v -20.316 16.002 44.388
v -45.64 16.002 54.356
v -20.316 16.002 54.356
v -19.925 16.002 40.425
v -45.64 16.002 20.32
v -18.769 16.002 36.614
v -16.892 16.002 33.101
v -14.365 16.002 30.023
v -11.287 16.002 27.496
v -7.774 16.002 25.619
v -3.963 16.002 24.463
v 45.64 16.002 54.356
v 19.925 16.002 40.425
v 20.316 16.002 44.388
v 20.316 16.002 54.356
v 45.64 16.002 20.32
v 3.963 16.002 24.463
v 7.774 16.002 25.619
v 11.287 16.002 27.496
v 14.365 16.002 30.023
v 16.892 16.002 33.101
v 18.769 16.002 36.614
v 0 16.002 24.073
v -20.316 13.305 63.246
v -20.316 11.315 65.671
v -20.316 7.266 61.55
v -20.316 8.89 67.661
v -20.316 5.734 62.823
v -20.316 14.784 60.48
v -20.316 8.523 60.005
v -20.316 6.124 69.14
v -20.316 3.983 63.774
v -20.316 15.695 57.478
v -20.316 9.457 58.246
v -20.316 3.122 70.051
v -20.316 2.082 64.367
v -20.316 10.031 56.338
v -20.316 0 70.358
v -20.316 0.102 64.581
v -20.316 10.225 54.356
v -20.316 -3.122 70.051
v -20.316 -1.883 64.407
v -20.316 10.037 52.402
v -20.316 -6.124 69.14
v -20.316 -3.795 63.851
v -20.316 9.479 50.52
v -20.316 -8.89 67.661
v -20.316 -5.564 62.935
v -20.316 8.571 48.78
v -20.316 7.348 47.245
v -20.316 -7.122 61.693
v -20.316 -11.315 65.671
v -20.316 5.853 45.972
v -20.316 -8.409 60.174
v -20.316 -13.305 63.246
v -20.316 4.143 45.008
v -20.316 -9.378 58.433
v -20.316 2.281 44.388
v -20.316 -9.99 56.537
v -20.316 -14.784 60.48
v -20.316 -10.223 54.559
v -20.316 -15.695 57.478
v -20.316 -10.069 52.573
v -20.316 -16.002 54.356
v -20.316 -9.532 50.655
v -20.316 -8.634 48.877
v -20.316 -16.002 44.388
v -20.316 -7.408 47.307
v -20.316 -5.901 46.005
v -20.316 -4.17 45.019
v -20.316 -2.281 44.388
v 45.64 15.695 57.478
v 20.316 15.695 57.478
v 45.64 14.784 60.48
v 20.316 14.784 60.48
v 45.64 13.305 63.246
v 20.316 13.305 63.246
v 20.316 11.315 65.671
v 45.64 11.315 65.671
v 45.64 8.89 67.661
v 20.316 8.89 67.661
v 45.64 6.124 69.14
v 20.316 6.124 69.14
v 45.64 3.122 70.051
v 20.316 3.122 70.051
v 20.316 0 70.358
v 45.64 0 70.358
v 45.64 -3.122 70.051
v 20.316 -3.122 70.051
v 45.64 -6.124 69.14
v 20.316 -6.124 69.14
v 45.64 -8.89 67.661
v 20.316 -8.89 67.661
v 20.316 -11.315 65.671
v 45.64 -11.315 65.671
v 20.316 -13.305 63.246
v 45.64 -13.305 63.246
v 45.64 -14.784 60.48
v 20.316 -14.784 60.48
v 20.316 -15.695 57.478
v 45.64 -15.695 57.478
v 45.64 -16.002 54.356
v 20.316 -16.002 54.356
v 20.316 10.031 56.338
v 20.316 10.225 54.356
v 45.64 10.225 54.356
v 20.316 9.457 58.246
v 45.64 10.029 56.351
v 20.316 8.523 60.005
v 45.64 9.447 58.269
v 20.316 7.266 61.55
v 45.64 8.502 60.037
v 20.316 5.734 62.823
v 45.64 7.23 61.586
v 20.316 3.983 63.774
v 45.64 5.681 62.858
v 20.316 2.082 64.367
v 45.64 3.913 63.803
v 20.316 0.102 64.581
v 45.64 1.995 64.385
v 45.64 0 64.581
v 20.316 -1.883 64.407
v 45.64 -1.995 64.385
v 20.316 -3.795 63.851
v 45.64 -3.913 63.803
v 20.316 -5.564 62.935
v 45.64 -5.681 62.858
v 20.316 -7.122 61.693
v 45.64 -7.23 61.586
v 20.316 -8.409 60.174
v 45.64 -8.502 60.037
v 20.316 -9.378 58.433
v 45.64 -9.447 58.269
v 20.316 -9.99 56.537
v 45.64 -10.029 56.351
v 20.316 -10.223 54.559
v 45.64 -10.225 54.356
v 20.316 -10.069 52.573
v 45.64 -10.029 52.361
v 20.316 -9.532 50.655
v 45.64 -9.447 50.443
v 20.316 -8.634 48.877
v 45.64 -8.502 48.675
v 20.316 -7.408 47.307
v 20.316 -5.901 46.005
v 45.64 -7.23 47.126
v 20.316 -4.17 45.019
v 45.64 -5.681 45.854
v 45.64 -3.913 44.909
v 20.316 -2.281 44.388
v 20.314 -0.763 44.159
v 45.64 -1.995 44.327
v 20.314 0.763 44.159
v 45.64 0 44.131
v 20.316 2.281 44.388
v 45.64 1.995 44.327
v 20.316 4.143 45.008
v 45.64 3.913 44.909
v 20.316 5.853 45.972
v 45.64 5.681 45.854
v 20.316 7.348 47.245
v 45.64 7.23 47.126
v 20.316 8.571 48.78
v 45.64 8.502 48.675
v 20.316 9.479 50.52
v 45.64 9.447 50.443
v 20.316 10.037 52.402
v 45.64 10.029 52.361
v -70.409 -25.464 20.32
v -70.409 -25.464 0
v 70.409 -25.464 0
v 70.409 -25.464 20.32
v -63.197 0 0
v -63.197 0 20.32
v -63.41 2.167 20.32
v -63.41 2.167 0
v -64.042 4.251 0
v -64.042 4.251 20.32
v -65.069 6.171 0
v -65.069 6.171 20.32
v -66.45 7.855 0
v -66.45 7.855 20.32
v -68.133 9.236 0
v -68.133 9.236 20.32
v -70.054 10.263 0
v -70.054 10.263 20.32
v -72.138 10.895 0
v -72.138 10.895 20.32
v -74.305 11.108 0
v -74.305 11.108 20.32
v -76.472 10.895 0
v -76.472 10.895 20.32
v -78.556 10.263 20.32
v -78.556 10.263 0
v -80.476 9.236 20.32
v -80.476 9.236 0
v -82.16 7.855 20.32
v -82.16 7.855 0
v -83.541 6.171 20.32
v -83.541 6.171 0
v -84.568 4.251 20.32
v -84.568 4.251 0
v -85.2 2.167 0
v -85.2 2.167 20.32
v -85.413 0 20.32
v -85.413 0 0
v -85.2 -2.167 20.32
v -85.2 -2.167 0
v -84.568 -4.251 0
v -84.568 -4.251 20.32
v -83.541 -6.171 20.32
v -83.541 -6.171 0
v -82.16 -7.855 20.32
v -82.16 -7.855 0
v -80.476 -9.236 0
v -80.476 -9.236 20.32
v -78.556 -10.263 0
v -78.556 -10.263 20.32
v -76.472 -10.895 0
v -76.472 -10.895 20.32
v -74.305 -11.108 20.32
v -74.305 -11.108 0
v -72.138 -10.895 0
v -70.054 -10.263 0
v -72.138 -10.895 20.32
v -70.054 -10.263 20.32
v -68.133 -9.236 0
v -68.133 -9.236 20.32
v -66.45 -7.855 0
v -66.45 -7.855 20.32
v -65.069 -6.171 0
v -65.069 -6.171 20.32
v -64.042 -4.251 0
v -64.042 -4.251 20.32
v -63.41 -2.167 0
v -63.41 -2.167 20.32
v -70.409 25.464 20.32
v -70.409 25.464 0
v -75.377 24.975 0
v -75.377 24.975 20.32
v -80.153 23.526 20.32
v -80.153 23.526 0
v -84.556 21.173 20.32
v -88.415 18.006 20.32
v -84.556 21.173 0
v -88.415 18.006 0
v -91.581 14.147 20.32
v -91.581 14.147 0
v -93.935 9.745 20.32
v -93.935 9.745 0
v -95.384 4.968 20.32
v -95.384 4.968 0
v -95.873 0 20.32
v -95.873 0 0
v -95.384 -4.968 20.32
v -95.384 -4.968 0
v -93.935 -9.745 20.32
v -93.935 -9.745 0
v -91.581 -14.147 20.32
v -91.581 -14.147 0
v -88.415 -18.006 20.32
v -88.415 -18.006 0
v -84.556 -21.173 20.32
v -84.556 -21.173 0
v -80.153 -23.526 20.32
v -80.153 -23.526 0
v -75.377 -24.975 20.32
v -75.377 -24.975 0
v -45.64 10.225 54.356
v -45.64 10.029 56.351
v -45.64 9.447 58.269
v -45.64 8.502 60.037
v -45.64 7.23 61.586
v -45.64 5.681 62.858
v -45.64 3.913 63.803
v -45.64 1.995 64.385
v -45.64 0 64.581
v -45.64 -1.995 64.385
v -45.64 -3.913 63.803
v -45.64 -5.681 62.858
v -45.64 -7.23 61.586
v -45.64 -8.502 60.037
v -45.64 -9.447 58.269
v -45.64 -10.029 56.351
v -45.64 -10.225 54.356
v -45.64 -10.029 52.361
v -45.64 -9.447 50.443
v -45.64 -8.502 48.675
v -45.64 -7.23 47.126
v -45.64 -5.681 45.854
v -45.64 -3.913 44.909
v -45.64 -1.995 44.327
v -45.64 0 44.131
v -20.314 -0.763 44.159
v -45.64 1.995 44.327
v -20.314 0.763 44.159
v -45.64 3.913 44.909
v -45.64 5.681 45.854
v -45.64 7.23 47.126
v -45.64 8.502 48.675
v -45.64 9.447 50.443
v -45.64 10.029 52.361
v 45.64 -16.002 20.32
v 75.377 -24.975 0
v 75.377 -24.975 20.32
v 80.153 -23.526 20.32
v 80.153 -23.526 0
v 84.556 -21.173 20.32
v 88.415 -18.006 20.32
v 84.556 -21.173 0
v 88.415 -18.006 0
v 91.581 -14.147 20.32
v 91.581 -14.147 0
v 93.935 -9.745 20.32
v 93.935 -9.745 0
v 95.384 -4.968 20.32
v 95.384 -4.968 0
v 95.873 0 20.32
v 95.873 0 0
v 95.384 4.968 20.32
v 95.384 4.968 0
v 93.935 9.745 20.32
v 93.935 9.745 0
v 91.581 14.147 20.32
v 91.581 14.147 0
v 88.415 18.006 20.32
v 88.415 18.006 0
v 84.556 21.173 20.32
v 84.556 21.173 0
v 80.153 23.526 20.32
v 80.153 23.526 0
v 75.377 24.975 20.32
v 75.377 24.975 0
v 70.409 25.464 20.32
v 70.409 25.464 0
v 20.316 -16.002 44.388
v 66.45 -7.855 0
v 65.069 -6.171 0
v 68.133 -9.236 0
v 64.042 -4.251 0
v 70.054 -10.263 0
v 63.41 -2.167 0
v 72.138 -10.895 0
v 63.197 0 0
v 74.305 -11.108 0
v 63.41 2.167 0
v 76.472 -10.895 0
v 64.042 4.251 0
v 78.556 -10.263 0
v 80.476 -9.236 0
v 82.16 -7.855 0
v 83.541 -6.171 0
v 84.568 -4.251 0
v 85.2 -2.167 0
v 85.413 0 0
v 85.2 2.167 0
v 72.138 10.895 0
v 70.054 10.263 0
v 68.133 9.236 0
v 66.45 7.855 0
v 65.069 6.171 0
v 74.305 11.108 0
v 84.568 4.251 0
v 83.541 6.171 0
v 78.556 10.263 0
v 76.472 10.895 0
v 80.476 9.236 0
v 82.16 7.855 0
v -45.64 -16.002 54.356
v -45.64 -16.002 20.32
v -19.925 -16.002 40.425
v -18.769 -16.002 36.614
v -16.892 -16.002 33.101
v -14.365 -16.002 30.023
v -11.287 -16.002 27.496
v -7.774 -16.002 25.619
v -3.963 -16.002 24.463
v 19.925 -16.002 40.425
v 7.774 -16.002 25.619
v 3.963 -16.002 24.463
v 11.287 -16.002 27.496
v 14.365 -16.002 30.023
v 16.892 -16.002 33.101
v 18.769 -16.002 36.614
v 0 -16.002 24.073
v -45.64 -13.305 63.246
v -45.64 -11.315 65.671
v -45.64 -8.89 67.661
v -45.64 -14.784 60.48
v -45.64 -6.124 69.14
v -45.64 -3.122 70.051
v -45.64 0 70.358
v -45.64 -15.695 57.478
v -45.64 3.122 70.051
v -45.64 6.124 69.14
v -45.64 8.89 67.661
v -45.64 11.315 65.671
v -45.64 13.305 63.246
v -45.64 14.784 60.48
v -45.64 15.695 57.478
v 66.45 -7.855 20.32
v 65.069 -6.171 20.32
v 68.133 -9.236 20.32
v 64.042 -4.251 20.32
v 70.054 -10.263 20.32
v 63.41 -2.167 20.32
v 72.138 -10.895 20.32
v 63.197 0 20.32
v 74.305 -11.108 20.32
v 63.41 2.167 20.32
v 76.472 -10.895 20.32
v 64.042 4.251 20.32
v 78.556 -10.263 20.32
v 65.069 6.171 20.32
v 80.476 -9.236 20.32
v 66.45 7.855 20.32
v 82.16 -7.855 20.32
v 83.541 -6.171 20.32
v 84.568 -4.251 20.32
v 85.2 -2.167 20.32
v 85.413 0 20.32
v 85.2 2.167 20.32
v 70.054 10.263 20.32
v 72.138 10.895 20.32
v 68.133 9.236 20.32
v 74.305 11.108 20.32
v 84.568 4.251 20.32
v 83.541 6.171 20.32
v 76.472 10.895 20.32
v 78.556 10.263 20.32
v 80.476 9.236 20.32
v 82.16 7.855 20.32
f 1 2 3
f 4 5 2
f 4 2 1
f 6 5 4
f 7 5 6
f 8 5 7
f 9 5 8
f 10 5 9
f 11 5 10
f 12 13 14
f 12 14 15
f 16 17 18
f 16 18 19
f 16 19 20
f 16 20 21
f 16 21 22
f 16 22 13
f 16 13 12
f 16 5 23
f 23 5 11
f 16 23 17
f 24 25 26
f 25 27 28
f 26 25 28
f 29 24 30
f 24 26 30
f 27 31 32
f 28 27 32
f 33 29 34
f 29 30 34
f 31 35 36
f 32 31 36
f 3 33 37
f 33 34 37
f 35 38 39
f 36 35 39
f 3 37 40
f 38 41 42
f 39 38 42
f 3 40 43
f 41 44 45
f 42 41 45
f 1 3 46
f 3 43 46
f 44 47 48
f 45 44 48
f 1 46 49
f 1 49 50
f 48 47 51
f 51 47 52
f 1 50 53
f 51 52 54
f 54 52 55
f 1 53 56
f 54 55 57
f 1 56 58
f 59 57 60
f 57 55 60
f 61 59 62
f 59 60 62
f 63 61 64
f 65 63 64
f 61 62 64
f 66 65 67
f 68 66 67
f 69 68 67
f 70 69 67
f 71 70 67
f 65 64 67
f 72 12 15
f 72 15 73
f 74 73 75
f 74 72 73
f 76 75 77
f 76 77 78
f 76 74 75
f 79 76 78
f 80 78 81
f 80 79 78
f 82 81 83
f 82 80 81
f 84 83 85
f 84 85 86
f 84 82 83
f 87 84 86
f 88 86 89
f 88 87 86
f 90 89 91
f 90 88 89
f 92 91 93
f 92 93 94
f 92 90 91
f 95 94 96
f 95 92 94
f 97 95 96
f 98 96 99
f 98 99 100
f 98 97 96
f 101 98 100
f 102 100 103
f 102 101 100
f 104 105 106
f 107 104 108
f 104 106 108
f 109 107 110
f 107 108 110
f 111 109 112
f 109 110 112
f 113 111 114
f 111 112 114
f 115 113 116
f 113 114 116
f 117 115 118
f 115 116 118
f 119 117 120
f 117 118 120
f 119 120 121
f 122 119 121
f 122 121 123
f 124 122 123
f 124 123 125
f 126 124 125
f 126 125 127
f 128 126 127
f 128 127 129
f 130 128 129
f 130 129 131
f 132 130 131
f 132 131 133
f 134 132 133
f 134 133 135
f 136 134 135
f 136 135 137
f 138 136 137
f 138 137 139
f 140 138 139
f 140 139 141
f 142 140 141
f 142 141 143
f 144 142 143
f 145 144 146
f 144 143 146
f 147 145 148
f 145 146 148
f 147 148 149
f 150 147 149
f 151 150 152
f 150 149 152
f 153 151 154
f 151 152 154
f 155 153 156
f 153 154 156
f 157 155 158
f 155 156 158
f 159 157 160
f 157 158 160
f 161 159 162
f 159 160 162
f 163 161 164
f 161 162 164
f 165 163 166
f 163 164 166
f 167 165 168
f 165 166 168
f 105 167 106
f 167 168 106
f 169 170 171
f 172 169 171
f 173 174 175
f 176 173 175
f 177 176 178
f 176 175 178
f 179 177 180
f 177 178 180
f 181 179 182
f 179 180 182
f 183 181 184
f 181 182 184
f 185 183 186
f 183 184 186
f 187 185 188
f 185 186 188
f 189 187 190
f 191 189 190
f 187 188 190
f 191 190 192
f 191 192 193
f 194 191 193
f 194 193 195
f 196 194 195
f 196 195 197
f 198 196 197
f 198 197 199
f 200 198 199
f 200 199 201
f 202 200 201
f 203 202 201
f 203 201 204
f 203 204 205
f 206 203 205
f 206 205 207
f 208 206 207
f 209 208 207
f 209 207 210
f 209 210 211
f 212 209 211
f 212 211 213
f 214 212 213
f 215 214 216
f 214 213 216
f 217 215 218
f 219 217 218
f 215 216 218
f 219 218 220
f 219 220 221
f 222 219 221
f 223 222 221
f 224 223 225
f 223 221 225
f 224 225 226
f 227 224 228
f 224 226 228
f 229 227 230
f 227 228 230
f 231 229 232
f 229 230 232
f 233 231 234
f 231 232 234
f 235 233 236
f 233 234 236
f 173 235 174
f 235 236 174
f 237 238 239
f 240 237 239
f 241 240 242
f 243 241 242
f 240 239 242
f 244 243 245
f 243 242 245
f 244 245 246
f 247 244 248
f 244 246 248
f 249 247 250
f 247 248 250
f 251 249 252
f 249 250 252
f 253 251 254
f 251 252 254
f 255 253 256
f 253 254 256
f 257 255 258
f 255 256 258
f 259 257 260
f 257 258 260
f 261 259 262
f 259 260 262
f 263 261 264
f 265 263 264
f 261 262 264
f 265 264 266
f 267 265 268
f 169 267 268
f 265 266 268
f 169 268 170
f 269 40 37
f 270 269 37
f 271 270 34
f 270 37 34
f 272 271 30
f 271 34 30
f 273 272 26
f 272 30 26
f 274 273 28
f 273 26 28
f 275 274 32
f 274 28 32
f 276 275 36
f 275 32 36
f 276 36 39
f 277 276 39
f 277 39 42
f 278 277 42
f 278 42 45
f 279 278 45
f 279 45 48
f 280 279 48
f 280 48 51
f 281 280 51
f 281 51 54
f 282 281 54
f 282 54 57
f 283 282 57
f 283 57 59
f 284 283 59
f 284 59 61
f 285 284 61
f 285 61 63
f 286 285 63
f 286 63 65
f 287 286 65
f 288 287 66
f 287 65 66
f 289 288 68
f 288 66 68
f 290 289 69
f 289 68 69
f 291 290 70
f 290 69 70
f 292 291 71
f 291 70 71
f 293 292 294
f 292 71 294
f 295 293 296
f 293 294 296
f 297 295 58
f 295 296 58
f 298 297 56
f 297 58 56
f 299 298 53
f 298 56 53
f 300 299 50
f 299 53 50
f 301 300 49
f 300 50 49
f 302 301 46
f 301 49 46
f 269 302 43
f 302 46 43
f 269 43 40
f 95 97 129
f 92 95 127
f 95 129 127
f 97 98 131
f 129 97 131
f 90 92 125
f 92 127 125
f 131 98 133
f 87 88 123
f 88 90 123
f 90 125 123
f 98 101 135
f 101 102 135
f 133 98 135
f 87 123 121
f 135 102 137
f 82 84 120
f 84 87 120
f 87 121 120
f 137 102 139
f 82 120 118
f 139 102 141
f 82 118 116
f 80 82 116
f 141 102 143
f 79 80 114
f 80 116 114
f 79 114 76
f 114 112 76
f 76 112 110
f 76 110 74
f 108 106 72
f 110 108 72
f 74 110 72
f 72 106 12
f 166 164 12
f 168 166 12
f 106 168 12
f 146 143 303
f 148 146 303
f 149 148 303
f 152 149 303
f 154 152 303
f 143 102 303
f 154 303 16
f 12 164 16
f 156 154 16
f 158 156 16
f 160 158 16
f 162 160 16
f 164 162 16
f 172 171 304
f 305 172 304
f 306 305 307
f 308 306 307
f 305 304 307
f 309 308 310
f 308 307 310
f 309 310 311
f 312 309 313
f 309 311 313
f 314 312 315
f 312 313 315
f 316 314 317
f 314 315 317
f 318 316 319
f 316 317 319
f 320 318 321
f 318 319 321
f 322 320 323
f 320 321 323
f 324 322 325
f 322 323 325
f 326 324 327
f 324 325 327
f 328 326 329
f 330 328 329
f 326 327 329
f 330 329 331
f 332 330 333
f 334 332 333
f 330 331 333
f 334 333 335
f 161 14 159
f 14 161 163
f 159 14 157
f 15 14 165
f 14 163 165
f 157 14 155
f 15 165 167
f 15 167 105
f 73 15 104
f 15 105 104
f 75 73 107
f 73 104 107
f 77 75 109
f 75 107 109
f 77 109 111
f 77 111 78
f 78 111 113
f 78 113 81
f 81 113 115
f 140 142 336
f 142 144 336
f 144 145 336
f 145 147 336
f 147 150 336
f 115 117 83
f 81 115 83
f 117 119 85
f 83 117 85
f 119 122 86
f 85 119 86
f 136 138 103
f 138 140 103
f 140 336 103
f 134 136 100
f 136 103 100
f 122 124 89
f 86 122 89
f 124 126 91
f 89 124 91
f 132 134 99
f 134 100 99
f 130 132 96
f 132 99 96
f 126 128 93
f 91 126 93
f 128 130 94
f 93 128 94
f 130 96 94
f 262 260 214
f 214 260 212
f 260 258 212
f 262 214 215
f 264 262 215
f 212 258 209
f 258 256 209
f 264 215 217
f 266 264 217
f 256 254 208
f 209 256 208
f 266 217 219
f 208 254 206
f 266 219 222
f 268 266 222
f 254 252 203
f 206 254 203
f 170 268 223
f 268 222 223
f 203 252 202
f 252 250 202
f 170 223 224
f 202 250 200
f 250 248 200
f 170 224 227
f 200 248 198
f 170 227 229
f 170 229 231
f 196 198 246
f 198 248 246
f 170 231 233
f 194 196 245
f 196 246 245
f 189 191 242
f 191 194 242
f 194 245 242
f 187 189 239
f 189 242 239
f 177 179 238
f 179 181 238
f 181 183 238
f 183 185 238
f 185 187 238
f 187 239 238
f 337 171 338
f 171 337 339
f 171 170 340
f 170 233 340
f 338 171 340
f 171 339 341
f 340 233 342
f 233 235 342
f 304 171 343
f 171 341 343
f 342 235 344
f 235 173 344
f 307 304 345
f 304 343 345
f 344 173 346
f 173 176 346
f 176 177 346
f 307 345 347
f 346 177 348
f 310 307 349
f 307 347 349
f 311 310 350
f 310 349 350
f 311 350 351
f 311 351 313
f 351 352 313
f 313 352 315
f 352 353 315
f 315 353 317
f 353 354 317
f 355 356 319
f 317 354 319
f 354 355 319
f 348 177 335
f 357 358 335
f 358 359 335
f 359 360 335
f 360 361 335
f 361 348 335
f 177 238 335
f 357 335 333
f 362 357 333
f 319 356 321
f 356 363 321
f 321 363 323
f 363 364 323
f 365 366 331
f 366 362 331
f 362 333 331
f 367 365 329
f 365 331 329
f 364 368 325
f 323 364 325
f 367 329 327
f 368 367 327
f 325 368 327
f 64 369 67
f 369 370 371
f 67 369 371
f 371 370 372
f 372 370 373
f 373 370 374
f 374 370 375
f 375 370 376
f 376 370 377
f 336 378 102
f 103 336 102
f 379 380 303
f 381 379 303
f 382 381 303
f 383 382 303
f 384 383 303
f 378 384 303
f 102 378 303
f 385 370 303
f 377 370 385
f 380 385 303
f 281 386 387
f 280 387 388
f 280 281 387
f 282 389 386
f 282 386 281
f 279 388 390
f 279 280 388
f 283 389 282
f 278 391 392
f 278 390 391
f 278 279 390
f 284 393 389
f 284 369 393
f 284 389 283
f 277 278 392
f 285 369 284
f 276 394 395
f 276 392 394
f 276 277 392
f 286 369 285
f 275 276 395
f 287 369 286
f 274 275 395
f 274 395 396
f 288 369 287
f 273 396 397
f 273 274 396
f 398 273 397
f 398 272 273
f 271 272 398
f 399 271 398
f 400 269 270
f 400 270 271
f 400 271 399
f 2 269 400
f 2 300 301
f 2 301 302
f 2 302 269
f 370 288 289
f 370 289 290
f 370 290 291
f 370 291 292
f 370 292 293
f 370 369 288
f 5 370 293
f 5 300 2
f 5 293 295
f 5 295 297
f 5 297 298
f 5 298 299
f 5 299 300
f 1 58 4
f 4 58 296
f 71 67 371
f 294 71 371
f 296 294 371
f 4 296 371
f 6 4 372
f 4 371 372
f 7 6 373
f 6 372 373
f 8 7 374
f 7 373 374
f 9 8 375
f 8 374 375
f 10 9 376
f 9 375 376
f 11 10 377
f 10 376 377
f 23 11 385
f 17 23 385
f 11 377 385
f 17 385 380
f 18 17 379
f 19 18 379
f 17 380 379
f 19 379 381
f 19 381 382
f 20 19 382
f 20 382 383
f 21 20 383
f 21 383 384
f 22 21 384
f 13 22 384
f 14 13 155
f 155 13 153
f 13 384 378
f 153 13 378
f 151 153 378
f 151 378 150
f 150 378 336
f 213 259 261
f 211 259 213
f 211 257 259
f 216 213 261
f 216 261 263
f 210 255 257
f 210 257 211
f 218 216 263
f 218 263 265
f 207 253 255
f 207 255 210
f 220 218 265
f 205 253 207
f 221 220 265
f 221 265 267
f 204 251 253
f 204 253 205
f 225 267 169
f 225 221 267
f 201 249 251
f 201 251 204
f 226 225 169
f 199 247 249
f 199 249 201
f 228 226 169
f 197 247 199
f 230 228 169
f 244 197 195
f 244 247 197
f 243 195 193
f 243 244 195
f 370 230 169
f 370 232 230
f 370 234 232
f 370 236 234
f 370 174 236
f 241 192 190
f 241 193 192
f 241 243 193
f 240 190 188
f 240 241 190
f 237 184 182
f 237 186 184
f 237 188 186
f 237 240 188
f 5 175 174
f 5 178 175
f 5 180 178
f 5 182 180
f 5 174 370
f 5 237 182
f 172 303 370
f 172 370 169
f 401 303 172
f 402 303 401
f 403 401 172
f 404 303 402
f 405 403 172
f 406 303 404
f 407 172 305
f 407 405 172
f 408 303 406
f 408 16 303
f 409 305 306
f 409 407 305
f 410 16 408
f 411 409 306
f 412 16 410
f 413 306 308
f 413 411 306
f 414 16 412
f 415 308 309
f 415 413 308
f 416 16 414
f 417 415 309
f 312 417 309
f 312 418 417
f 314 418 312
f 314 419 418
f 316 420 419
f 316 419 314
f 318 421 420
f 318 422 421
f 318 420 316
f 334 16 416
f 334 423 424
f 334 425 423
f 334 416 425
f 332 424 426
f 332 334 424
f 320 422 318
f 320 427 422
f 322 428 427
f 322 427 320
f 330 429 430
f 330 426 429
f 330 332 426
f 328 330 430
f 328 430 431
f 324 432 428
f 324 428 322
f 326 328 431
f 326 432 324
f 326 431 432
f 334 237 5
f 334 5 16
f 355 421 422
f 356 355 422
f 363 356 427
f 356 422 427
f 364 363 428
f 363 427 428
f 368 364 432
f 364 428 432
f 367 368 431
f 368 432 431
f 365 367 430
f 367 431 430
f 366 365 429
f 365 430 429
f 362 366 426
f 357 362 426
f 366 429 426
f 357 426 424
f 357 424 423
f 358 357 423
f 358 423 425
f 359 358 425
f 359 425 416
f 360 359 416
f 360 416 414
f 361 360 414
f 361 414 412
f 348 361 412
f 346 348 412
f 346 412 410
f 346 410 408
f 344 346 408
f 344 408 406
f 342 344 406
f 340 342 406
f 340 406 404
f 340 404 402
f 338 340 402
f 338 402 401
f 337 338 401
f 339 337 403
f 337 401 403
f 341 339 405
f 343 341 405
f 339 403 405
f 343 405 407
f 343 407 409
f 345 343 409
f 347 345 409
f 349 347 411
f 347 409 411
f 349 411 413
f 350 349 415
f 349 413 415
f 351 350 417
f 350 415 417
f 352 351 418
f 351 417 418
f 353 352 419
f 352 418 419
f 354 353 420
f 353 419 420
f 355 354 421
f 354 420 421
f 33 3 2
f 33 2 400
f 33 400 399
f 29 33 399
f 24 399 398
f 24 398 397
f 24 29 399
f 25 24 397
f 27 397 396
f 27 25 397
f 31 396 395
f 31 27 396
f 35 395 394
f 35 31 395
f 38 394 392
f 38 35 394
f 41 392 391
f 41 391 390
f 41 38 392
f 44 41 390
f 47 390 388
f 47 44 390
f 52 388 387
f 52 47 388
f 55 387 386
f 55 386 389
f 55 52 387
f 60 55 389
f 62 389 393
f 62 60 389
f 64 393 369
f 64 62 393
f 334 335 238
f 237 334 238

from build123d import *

# Parameters (mm, degrees)
F1_DEPTH  = 20.32
F2_R      = 11.1083186408
F3_DEPTH  = 25.4
F4_W      = 91.2809744477
F4_H      = 32.0040024817
F5_DEPTH  = 34.036
F6_R      = 16.0020012408
F7_DEPTH  = 91.2809744477
F9_DEPTH  = 33.528
F10_R     = 10.2254227484
F11_DEPTH = 105.41


with BuildPart() as f1:
    # F0 (on Top) → F1 (new body)
    with BuildSketch(Plane.XY):
        with BuildLine():
            ThreePointArc((70.4088062048, -25.4640523344), (95.8728585392, 0), (70.4088062048, 25.4640523344))
            Line((70.4088062048, 25.4640523344), (-70.4088062048, 25.4640523344))
            ThreePointArc((-70.4088062048, 25.4640523344), (-95.8728585392, 0), (-70.4088062048, -25.4640523344))
            Line((-70.4088062048, -25.4640523344), (70.4088062048, -25.4640523344))
        make_face()
    extrude(amount=F1_DEPTH)

    # F2 (on face) → F3 (cut)
    with BuildSketch(Plane.XY.offset(20.32)):
        with Locations((74.3049383163, 0)):
            Circle(F2_R)
        with Locations((-74.3049383163, 0)):
            Circle(F2_R)
    extrude(amount=-F3_DEPTH, mode=Mode.SUBTRACT)

    # F4 (on face) → F5 (join)
    with BuildSketch(Plane.XY.offset(20.32)):
        Rectangle(F4_W, F4_H)
    extrude(amount=F5_DEPTH)

    # F6 (on face) → F7 (join, through all)
    with BuildSketch(Plane.YZ.offset(45.6404872239)):
        with Locations((0, 54.356)):
            Circle(F6_R)
    extrude(amount=-F7_DEPTH)

    # F8 (on Front) → F9 (cut, symmetric)
    with BuildSketch(Plane.XZ):
        with BuildLine():
            Line((20.3155819327, 44.3881601095), (20.3155819327, 96.7077314854))
            Line((20.3155819327, 96.7077314854), (-20.3155819327, 96.7077314854))
            Line((-20.3155819327, 96.7077314854), (-20.3155819327, 44.3881601095))
            ThreePointArc((-20.3155819327, 44.3881601095), (0, 24.0725781769), (20.3155819327, 44.3881601095))
        make_face()
    extrude(amount=F9_DEPTH, both=True, mode=Mode.SUBTRACT)

    # F10 (on face) → F11 (cut)
    with BuildSketch(Plane.YZ.offset(45.6404872239)):
        with Locations((0, 54.356)):
            Circle(F10_R)
    extrude(amount=-F11_DEPTH, mode=Mode.SUBTRACT)


solid = f1.part
